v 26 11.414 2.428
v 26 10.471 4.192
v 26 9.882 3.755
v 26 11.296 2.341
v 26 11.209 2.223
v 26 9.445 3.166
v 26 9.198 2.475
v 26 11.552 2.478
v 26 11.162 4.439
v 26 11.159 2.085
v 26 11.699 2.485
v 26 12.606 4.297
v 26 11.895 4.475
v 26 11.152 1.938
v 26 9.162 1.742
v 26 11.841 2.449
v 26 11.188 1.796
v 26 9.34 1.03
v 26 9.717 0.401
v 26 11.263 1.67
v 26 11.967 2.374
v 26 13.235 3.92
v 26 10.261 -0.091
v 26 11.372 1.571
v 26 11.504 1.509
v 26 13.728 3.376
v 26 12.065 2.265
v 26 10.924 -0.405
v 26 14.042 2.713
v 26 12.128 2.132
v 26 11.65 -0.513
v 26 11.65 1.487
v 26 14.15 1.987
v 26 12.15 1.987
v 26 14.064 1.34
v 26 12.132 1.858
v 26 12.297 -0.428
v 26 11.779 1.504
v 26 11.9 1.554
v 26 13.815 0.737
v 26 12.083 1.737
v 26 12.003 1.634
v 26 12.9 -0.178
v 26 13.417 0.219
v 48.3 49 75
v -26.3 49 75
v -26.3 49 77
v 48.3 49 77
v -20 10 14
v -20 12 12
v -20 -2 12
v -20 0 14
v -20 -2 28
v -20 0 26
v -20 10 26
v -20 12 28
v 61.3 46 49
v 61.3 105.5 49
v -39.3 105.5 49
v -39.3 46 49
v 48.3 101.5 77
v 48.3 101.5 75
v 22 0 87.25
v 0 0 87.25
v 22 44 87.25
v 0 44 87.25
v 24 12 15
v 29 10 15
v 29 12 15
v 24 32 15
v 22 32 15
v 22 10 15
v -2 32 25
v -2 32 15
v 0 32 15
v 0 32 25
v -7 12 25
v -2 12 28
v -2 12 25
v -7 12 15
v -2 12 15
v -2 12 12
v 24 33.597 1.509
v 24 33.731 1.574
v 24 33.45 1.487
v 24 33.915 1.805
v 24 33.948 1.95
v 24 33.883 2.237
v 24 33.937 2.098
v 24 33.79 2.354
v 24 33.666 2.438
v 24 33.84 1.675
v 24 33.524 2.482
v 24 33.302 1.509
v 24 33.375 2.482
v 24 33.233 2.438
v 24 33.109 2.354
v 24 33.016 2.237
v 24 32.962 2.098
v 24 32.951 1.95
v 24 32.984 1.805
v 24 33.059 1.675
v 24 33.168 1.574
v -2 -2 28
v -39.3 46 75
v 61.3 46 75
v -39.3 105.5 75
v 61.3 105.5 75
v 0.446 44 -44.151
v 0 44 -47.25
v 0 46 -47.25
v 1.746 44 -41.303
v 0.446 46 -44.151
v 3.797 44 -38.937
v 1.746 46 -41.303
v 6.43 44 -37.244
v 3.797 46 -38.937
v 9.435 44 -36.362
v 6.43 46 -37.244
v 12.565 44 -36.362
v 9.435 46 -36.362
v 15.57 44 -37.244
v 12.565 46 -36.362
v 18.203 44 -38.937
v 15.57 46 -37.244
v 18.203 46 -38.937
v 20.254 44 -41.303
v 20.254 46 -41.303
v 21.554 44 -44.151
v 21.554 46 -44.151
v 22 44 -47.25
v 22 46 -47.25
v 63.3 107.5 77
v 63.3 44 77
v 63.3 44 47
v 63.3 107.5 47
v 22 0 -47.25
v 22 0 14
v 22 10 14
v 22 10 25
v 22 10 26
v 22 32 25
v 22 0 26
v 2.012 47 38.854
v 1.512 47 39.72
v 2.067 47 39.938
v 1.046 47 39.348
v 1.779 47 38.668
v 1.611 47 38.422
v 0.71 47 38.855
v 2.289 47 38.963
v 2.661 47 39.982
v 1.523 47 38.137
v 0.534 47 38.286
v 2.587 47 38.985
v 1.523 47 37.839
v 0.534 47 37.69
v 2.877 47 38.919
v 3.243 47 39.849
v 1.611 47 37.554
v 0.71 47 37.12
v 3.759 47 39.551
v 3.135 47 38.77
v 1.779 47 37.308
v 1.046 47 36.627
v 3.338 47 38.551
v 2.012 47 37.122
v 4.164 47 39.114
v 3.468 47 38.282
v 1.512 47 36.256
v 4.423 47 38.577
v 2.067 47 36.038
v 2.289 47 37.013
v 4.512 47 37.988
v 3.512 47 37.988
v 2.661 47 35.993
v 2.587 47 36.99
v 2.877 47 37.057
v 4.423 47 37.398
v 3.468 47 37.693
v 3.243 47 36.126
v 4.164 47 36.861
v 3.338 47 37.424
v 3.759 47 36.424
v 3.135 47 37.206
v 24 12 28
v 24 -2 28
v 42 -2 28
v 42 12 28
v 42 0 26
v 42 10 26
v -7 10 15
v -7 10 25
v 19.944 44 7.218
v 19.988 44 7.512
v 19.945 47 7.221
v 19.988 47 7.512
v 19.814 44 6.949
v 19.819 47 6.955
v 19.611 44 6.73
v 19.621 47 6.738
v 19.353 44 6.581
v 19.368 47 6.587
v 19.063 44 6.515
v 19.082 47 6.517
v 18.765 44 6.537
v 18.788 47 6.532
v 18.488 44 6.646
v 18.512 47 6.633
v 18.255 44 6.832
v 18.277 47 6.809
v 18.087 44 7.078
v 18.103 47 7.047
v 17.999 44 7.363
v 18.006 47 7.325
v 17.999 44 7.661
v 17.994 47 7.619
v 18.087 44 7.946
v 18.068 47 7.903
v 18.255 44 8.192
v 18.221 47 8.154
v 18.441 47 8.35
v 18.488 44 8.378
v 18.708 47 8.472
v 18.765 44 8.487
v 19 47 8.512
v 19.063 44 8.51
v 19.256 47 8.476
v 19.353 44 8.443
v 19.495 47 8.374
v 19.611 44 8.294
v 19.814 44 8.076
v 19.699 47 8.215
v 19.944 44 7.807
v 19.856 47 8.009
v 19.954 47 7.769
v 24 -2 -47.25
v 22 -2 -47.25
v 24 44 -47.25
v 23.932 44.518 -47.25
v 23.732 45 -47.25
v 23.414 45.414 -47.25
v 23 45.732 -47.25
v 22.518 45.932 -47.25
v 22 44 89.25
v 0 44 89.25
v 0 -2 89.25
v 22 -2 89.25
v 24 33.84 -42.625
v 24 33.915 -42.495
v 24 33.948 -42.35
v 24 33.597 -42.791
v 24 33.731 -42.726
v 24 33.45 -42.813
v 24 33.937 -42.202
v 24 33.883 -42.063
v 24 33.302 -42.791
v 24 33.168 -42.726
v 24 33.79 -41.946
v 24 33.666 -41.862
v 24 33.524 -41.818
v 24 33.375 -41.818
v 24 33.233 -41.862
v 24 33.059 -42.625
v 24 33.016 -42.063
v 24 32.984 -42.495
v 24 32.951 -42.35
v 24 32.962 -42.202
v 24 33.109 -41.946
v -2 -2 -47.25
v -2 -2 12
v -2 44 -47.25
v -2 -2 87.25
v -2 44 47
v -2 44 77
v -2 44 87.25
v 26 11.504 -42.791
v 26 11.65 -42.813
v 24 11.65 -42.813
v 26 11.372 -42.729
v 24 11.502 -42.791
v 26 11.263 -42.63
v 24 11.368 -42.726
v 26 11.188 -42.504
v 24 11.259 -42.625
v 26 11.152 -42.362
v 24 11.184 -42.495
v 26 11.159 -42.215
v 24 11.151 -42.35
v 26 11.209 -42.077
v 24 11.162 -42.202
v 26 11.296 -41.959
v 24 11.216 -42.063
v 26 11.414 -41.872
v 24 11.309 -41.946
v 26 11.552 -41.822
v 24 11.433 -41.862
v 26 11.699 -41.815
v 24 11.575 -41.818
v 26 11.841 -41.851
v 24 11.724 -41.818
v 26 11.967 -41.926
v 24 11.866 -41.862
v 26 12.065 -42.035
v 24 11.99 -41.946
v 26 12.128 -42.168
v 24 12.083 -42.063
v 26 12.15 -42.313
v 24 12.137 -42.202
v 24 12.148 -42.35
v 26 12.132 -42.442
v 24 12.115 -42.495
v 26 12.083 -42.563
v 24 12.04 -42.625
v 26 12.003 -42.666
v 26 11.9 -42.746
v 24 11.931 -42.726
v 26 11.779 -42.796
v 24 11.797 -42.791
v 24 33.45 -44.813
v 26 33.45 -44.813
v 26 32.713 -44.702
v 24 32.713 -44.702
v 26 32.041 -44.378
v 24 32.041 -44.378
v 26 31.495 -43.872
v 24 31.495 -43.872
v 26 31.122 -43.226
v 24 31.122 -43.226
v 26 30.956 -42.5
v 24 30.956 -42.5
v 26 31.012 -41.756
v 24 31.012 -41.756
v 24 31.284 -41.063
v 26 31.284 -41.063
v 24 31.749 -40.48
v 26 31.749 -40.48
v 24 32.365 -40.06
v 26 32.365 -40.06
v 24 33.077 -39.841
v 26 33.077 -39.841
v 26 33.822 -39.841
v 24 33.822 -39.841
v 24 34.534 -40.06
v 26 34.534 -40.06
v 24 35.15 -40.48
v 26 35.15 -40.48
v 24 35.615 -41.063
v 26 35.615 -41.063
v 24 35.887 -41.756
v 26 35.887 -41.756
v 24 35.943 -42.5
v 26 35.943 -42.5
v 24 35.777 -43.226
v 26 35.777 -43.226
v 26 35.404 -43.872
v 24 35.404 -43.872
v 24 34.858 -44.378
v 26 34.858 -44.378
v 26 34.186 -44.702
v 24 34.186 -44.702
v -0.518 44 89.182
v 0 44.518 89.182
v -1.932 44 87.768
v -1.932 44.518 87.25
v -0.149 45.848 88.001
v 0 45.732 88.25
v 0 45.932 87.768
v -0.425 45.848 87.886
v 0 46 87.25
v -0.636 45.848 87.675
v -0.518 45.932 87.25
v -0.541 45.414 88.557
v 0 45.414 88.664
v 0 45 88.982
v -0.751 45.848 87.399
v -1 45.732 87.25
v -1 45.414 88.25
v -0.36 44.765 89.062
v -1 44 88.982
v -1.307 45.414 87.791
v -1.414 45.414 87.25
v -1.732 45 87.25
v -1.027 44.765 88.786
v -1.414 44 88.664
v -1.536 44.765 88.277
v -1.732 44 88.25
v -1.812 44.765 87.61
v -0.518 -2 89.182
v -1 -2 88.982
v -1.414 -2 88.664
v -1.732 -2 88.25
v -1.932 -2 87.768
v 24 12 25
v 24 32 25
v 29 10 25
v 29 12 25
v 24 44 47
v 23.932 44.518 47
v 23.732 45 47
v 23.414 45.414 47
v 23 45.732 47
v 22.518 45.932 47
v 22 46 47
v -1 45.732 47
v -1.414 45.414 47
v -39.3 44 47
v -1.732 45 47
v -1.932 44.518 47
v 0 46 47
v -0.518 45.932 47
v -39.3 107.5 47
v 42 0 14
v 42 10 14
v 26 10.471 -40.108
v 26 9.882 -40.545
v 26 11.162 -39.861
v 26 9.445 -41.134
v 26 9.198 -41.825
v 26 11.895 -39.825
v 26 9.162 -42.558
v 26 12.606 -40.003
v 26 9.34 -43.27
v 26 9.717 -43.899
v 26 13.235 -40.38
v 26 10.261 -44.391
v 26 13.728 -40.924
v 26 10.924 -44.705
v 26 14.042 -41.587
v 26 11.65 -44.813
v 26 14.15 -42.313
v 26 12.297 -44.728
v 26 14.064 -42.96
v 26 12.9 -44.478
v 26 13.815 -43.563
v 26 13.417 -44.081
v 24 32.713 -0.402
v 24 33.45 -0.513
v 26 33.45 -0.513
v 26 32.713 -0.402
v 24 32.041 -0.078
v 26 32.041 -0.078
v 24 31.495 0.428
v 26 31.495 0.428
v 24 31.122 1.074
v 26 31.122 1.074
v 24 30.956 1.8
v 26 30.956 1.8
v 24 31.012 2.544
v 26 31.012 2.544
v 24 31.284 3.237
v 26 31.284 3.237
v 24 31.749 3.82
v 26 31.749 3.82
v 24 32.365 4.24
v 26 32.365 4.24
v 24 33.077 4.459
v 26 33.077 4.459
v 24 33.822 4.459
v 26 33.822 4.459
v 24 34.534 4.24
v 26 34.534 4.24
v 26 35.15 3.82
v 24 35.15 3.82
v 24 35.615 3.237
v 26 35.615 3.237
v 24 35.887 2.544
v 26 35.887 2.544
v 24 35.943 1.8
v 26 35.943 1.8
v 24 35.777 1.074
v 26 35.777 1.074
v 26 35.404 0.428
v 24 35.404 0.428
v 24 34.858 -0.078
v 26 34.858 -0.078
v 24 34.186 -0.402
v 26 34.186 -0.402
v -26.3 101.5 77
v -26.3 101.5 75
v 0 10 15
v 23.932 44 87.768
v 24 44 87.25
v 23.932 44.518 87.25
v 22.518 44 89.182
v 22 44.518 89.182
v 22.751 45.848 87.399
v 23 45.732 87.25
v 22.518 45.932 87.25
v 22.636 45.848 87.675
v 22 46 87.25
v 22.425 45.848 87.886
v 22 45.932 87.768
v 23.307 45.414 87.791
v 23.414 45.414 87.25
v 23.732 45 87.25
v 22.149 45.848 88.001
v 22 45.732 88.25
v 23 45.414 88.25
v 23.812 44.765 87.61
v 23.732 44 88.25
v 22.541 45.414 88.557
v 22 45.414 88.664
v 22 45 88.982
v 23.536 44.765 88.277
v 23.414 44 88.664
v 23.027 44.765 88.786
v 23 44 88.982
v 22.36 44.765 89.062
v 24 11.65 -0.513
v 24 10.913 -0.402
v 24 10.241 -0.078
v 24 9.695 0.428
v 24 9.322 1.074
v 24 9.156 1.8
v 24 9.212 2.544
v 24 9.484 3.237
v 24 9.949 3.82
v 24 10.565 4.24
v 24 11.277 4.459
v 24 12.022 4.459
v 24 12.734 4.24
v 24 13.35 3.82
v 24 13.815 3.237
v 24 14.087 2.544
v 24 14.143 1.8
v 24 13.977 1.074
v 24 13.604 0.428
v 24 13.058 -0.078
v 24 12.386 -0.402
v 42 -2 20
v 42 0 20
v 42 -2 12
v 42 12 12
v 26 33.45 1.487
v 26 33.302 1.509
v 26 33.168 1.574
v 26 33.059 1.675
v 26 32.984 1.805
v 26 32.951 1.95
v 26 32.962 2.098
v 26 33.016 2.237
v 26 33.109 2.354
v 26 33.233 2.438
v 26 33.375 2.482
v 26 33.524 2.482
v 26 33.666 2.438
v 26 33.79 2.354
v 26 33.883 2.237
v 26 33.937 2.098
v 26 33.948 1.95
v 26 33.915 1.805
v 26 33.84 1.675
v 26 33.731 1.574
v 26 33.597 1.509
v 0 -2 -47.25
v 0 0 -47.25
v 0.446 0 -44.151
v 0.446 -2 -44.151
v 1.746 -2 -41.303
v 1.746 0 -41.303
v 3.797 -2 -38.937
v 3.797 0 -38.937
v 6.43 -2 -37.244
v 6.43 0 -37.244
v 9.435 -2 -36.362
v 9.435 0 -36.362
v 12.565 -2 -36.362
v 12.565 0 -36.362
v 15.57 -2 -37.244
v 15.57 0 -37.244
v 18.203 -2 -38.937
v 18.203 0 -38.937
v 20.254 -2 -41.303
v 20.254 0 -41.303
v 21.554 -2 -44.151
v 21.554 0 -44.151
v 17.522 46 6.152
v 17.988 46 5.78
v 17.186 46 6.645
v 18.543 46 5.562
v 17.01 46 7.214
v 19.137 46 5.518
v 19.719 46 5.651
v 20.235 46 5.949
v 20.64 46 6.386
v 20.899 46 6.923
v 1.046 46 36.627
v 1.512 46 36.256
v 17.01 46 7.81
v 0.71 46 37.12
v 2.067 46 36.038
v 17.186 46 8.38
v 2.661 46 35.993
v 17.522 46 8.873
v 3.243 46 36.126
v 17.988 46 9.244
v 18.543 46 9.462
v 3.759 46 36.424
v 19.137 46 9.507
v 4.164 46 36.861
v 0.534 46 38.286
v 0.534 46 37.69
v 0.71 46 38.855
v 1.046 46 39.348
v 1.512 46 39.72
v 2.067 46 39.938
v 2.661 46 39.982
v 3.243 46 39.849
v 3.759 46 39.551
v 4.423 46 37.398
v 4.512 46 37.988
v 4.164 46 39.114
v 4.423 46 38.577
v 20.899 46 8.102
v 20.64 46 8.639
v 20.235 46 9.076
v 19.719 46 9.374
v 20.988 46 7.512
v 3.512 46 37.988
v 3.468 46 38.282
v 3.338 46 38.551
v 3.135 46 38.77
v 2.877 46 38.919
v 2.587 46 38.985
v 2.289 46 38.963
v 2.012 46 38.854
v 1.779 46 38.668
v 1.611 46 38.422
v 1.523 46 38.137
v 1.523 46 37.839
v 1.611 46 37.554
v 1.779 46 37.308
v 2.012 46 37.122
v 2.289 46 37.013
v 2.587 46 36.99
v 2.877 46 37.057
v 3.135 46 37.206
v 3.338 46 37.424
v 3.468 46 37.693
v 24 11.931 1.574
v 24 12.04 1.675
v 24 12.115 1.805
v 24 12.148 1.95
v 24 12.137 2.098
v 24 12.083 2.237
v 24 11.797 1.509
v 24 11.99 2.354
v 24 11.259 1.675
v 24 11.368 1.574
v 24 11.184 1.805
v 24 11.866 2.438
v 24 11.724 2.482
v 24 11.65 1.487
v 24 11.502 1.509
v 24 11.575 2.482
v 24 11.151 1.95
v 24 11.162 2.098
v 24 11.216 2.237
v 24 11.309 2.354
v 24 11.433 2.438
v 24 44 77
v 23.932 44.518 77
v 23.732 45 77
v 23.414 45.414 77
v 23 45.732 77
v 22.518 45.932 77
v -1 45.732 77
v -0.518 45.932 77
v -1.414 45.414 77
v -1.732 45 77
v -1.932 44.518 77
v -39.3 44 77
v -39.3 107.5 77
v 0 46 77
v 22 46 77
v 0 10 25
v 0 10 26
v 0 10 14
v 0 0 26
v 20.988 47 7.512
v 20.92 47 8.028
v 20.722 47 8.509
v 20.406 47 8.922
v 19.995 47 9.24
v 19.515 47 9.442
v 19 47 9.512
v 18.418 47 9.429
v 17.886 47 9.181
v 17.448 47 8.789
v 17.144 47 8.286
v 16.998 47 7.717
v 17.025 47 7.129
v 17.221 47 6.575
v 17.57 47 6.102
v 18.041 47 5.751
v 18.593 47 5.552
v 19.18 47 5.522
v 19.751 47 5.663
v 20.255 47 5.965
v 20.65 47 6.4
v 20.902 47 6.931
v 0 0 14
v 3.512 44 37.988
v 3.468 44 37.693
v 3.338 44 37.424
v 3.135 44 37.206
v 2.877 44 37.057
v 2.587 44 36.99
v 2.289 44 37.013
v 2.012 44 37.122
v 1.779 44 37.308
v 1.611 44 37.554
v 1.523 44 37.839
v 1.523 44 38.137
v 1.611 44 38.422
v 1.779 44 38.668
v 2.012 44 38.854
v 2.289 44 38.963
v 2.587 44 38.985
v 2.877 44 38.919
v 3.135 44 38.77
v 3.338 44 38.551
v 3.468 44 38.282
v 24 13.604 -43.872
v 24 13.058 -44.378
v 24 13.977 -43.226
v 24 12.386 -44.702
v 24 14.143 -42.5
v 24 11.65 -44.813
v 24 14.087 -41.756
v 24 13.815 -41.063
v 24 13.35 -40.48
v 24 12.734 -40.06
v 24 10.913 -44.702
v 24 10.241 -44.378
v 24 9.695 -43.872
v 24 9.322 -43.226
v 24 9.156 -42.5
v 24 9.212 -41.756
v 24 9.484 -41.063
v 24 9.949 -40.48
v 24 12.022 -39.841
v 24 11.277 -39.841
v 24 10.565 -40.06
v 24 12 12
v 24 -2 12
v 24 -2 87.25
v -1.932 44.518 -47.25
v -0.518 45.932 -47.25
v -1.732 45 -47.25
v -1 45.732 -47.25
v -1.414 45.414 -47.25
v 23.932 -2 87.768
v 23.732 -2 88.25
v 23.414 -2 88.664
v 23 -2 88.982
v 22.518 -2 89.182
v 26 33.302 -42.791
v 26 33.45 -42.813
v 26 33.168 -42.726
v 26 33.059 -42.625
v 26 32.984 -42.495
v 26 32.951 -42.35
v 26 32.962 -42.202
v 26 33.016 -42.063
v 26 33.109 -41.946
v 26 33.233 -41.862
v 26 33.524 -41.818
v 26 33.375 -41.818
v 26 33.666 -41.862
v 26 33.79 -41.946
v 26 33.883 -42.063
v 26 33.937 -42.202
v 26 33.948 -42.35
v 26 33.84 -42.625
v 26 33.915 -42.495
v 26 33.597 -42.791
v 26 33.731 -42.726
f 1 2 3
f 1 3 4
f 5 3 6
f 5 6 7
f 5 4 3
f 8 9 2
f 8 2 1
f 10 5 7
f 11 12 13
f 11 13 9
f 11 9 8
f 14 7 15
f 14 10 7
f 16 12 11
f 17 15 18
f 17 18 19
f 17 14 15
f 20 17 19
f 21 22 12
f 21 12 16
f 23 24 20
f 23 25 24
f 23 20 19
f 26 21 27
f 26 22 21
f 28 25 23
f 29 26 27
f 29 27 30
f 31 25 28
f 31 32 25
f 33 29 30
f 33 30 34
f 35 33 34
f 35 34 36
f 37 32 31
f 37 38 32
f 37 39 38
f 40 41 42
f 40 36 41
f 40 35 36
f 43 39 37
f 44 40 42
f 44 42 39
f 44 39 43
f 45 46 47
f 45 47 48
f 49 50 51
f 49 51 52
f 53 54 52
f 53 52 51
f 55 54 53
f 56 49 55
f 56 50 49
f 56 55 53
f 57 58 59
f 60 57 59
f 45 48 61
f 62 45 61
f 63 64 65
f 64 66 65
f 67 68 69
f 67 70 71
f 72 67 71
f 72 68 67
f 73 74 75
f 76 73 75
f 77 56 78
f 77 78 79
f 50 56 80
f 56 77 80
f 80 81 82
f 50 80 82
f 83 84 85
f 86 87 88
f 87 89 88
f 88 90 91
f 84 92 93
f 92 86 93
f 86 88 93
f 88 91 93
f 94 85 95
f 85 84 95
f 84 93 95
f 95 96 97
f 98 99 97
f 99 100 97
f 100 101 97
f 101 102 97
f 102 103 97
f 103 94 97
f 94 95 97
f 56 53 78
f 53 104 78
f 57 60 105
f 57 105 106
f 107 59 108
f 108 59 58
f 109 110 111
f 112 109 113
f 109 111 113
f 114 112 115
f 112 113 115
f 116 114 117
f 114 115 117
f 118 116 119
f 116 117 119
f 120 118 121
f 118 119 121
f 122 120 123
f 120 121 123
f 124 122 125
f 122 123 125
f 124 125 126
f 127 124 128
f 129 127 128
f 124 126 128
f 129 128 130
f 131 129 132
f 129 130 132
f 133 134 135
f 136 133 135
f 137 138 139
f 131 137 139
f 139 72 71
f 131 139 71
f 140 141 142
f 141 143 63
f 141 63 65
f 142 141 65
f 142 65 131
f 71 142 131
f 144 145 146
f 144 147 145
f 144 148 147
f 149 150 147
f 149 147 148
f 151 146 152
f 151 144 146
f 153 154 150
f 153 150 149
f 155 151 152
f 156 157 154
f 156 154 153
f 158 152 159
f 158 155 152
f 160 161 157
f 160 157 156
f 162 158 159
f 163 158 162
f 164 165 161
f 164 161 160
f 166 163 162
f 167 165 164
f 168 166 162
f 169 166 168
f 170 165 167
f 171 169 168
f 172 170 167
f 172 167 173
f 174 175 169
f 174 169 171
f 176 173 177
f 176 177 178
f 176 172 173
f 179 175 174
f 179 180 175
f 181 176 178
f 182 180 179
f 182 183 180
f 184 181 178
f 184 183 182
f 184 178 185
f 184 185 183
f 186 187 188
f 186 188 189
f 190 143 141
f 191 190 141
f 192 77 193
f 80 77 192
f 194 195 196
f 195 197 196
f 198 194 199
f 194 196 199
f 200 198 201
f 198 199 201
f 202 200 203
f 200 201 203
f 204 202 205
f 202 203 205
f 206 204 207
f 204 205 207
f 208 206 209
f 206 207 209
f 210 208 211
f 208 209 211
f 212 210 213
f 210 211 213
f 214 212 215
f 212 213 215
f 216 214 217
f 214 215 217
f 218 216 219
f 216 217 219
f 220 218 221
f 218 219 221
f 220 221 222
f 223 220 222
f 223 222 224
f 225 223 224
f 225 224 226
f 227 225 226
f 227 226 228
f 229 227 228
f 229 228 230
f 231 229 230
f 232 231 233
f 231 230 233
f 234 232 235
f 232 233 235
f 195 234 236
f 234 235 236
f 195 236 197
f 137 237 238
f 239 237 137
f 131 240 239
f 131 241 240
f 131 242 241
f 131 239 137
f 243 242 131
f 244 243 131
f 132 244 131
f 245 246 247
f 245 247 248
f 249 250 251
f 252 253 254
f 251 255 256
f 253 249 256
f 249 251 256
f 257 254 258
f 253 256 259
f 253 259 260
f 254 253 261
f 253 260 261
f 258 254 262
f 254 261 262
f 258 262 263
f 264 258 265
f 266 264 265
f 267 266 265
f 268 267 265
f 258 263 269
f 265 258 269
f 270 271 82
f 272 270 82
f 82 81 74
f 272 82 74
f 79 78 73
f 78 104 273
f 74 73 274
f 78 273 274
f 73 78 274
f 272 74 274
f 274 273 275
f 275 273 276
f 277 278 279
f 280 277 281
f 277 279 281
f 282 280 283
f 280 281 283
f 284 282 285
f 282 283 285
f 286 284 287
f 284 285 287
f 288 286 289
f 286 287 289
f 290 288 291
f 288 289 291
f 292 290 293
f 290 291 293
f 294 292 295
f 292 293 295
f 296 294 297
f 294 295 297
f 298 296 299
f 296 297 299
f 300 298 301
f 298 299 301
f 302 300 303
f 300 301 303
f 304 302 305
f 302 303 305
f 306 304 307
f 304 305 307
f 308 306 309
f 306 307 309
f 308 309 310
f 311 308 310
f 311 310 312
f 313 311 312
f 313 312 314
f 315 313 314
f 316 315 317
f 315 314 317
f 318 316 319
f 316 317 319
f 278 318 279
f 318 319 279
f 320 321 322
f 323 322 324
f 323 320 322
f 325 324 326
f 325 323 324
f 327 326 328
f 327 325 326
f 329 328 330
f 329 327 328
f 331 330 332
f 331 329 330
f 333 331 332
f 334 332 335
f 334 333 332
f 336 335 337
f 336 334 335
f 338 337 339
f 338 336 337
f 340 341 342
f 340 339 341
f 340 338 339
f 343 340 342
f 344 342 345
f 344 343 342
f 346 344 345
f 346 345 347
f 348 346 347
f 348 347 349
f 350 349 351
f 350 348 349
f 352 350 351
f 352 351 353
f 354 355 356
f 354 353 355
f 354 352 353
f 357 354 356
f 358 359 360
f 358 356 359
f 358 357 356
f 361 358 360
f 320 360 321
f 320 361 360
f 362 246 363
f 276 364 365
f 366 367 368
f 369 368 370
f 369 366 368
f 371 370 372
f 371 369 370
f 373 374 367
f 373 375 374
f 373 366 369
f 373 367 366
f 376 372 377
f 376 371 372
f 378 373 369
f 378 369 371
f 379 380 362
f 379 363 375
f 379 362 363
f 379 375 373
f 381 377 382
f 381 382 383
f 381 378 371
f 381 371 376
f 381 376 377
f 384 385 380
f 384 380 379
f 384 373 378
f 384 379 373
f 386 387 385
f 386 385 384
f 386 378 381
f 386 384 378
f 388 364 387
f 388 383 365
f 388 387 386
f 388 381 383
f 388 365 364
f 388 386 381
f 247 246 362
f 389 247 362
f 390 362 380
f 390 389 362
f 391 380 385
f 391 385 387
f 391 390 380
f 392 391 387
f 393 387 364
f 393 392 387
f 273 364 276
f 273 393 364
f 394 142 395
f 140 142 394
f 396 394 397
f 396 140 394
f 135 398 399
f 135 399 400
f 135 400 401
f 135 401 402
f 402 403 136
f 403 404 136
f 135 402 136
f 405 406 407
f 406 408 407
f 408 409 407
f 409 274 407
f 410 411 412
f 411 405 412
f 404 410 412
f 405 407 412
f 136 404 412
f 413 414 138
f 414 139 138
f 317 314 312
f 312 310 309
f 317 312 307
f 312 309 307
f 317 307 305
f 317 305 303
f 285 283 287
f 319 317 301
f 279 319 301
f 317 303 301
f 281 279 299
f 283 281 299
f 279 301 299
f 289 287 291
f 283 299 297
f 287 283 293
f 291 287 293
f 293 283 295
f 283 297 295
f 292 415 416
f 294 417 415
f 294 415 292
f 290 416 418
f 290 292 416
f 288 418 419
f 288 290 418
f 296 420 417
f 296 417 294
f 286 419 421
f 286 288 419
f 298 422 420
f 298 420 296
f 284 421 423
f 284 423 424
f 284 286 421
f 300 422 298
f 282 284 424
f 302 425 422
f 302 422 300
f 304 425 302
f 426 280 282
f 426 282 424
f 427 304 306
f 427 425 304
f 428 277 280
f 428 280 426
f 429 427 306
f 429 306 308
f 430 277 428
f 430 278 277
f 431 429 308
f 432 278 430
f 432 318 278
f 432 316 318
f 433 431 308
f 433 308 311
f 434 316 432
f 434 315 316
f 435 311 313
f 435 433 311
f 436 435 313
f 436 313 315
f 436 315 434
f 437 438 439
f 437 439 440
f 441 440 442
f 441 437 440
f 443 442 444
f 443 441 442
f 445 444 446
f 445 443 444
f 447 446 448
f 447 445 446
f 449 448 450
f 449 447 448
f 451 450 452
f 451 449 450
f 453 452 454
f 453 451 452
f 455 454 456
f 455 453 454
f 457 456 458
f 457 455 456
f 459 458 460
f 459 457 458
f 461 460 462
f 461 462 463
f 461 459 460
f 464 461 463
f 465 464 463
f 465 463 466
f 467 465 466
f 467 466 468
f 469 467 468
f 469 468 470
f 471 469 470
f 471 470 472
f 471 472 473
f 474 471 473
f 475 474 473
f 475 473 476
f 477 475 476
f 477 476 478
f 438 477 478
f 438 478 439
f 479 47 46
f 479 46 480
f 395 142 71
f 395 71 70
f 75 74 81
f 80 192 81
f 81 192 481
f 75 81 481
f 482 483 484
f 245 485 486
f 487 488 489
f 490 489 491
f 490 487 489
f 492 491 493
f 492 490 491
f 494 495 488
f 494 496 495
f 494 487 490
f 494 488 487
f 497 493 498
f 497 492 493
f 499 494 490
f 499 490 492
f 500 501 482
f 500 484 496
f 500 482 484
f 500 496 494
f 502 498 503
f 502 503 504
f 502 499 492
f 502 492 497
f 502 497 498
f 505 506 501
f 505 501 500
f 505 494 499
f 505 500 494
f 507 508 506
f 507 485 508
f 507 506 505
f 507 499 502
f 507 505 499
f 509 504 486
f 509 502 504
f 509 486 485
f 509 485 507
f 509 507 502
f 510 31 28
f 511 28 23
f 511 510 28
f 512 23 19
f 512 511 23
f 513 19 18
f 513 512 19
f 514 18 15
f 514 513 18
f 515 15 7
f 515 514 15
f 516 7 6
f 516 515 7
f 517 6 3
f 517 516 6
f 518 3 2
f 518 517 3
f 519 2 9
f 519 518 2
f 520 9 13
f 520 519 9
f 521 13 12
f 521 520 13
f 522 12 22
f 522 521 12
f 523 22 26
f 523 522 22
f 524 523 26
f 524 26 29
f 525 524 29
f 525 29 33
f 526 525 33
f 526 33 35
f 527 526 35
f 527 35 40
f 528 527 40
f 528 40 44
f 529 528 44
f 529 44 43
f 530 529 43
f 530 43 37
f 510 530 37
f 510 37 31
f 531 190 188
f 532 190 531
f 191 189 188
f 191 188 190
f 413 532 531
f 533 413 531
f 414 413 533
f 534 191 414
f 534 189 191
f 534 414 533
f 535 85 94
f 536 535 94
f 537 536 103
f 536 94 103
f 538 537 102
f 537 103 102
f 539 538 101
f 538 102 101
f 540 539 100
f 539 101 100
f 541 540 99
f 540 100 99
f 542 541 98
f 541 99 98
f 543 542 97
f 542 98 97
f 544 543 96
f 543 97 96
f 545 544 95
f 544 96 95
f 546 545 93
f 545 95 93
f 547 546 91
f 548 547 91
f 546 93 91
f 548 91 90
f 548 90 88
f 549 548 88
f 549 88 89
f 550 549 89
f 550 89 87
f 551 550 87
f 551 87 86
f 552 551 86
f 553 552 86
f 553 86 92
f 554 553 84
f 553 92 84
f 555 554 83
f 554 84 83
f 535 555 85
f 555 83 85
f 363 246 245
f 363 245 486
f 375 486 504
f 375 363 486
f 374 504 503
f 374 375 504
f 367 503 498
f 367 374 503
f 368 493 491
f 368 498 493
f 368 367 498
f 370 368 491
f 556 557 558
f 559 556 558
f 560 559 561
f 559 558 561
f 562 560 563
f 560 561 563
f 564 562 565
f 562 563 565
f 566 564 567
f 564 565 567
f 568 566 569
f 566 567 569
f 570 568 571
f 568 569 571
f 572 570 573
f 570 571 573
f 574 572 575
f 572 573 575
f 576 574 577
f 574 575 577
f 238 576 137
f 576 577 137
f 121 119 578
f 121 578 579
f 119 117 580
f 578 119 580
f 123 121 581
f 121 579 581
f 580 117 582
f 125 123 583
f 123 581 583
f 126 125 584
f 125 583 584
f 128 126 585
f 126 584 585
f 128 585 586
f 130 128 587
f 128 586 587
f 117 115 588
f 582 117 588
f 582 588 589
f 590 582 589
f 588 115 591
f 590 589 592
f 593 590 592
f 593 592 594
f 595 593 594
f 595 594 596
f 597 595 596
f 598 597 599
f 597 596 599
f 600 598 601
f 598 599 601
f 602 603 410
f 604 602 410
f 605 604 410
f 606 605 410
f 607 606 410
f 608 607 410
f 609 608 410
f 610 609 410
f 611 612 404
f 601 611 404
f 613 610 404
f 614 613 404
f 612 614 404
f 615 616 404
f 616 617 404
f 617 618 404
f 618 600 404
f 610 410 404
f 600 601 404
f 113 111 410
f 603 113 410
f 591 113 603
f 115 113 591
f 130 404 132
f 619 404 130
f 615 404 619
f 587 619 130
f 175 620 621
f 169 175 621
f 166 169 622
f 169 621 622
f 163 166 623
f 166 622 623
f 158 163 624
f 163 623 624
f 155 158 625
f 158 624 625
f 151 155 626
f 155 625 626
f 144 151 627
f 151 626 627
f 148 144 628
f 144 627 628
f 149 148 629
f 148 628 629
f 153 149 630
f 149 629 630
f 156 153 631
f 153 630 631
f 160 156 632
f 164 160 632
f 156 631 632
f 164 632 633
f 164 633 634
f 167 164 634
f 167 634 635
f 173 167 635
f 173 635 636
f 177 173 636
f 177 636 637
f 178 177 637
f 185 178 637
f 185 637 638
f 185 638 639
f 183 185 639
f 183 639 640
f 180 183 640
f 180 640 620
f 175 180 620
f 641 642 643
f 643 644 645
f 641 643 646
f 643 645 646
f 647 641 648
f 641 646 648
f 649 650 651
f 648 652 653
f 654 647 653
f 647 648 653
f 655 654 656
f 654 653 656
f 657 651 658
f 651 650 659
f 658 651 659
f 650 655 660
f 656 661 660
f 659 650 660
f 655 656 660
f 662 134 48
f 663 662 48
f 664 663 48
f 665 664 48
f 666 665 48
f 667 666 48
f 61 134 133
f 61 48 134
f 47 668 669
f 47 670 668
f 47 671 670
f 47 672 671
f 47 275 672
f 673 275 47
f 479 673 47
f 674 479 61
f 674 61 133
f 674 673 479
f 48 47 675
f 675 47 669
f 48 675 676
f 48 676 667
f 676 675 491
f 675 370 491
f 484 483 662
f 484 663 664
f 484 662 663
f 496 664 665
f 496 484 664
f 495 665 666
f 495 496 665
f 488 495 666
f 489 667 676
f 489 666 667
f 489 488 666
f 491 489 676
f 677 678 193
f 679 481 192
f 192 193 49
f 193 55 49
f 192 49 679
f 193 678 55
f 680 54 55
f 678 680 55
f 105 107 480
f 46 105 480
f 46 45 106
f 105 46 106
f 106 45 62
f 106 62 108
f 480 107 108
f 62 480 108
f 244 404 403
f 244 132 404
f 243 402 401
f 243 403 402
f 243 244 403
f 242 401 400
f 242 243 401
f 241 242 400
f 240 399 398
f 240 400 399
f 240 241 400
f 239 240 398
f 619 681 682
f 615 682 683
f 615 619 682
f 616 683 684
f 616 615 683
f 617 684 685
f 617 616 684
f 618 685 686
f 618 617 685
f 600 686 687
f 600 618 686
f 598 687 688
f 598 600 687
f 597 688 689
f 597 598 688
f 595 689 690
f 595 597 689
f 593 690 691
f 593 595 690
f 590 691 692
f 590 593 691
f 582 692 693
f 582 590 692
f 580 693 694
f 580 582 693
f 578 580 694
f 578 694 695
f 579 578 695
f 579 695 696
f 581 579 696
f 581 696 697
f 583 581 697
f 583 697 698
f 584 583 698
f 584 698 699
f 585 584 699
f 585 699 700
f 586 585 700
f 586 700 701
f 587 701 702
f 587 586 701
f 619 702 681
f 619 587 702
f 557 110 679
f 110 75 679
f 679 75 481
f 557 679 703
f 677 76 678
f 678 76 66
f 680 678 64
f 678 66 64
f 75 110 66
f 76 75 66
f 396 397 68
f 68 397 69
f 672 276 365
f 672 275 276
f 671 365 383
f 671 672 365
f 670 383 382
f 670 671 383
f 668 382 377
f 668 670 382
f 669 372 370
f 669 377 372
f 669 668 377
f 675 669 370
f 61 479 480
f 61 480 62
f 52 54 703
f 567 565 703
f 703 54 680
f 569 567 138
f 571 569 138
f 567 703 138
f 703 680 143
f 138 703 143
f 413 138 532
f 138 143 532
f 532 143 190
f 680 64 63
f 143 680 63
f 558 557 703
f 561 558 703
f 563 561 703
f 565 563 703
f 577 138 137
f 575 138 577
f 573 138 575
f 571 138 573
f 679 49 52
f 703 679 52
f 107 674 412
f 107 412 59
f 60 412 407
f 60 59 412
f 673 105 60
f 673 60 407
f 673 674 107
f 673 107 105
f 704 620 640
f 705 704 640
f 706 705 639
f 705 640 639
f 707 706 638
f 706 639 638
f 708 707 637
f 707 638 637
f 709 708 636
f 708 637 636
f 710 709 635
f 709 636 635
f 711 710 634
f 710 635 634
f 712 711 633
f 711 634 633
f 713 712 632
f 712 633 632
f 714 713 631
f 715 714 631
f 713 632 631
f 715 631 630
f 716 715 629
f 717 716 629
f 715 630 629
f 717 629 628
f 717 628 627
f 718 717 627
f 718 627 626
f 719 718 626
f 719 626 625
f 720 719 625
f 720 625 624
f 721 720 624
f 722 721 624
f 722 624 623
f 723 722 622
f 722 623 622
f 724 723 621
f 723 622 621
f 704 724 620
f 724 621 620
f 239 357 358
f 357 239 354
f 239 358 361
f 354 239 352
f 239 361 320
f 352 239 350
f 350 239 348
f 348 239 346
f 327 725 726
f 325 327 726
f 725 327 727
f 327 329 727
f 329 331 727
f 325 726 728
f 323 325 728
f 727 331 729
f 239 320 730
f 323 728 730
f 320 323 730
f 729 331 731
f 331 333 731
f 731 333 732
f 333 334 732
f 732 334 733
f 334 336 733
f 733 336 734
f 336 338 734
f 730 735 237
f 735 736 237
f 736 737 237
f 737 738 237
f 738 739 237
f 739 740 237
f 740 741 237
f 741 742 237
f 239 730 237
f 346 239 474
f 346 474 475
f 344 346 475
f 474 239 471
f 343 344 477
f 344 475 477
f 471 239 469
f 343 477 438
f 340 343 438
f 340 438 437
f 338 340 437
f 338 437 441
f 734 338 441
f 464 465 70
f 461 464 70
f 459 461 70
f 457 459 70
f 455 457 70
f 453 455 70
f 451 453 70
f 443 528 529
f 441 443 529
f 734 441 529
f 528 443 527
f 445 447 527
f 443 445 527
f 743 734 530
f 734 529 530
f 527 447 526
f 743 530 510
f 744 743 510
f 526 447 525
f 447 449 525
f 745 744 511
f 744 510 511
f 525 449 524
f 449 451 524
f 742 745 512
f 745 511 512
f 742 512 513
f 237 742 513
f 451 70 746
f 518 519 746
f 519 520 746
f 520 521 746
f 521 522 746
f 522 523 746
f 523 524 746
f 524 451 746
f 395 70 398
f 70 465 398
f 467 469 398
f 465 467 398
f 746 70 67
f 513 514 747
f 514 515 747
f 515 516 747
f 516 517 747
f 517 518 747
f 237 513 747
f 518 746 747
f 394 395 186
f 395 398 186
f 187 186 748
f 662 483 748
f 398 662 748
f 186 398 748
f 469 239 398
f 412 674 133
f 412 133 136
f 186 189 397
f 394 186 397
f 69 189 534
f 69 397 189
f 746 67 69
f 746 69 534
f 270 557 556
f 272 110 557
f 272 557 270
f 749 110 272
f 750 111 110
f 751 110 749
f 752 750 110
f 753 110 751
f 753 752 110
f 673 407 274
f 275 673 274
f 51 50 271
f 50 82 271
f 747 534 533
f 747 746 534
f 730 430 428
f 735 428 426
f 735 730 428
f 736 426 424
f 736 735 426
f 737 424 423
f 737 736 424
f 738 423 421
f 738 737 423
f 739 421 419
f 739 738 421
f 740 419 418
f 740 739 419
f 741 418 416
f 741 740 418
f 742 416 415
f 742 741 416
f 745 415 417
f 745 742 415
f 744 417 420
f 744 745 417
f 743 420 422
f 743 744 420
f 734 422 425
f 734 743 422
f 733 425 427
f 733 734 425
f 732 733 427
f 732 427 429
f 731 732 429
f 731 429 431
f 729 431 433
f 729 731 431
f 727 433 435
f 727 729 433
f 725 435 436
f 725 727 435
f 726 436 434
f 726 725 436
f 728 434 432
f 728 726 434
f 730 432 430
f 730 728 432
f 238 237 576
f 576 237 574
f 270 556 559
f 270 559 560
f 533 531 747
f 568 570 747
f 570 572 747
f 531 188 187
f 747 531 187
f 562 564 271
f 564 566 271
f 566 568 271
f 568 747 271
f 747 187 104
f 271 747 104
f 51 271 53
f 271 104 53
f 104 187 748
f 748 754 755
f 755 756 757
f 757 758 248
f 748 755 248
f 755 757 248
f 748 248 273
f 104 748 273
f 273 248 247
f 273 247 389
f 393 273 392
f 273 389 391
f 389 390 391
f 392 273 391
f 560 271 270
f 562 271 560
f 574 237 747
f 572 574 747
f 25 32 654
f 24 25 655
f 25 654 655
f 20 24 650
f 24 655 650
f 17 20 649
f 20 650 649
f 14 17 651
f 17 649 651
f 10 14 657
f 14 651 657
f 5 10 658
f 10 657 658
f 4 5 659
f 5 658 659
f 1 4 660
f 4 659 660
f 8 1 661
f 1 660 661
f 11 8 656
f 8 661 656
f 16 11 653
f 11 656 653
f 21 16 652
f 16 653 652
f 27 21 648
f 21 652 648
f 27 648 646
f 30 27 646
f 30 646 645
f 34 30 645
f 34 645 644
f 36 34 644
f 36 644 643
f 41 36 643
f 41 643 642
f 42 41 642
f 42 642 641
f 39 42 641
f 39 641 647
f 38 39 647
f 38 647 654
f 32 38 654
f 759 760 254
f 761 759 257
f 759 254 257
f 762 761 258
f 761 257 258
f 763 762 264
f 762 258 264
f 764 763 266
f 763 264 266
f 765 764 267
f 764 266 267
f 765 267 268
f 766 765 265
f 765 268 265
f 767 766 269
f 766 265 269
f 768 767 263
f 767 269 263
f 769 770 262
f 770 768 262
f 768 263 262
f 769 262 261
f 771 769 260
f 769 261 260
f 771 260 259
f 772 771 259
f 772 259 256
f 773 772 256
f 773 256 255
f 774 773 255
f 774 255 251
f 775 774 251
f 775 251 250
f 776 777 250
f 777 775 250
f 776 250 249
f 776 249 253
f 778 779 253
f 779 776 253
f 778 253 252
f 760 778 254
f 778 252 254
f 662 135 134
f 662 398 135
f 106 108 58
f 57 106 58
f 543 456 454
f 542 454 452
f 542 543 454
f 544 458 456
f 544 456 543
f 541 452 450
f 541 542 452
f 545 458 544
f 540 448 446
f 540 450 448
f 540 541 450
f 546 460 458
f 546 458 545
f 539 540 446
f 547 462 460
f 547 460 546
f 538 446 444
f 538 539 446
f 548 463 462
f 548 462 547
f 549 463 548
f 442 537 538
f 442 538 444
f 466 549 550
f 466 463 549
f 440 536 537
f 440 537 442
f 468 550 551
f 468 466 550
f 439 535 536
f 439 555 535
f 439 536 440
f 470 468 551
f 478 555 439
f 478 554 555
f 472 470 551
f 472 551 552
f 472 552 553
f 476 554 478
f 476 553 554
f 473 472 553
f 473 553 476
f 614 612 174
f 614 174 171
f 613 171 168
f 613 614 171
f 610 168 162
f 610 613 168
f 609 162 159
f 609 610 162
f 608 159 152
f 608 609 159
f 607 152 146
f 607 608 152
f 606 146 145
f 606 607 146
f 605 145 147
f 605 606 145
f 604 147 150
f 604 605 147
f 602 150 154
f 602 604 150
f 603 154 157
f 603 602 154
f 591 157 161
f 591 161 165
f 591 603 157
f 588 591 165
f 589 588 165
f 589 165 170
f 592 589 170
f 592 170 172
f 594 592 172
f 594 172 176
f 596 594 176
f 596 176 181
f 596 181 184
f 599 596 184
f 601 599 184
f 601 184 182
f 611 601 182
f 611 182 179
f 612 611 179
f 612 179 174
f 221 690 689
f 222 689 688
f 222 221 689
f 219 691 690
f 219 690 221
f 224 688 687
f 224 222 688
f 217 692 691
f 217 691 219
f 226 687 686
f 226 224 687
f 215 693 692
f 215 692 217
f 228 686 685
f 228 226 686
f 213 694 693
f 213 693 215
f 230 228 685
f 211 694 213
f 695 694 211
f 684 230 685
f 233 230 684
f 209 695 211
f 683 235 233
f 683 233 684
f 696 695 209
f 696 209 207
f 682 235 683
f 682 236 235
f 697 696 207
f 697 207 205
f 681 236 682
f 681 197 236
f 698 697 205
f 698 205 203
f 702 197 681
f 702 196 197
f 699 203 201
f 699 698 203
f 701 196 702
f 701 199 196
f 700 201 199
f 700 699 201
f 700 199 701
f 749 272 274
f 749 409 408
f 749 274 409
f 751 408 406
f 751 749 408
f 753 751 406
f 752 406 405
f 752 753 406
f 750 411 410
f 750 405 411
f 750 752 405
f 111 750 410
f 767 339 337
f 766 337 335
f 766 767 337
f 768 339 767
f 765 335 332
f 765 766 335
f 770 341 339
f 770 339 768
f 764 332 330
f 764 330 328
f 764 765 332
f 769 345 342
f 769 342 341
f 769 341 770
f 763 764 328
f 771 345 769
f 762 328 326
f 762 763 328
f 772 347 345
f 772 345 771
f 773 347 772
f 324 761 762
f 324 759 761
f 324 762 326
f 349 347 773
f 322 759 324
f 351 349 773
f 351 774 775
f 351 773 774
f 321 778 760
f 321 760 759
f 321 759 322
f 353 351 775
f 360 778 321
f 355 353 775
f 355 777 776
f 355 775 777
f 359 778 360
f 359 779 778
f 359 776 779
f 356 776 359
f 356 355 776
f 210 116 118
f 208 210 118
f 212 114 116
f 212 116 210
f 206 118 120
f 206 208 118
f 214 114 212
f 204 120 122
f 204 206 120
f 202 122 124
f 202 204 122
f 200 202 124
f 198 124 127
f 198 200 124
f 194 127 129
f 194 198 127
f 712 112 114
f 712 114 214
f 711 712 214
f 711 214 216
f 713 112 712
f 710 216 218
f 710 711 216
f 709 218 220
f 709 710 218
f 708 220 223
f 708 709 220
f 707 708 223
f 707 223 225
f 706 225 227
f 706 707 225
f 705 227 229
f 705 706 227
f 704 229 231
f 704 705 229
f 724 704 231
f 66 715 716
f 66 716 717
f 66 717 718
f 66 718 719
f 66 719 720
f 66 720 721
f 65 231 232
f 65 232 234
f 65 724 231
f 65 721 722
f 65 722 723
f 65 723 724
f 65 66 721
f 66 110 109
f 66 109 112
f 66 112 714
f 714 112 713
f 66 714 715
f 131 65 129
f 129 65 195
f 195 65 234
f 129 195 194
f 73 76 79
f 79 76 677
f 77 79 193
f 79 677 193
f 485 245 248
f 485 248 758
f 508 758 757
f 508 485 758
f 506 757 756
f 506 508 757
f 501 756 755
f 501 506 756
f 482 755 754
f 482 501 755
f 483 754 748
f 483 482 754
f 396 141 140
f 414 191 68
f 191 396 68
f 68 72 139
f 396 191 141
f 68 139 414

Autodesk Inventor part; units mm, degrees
ref_plane "YZ Plane" through (0, 0, 0) normal (1, 0, 0) x (0, 1, 0)
ref_plane "XZ Plane" through (0, 0, 0) normal (0, 1, 0) x (-1, 0, 0)
ref_plane "XY Plane" through (0, 0, 0) normal (0, 0, 1) x (1, 0, 0)
sketch "Sketch1" plane through (0, 0, 0) normal (0, 0, 1) x (1, 0, 0)
  line L0 (0, 0) -> (22, 0)
  line L1 (22, 0) -> (22, 45)
  line L2 (22, 45) -> (0, 45)
  line L3 (0, 45) -> (0, 0)
  line L4 (-2, 47) -> (24, 47)
  line L5 (24, 47) -> (24, -2)
  line L6 (24, -2) -> (-2, -2)
  line L7 (-2, -2) -> (-2, 47)
  dimension "d0" = 22
  dimension "d1" = 45
  dimension "d2" = 2
extrude "Extrusion1" add sketch "Sketch1" along normal blind 40
sketch "Sketch2" plane through (24, -2, 0) normal (1, 0, 0) x (0, 0, -1)
  line L0 (0, 0) -> (-40, 0) projected
  line L1 (-20, 0) -> (-20, 2)
  line L2 (-20, 2) -> (-14, 2)
  line L3 (-14, 2) -> (-14, 12)
  line L4 (-14, 12) -> (-26, 12)
  line L5 (-26, 12) -> (-26, 2)
  line L6 (-26, 2) -> (-14, 2)
  line L7 (-28, 14) -> (-12, 14)
  line L8 (-12, 14) -> (-12, 0)
  line L9 (-12, 0) -> (-28, 0)
  line L10 (-28, 0) -> (-28, 14)
  point P0 (0, 2)
  dimension "d5" = 2
  dimension "d6" = 6
  dimension "d7" = 10
  dimension "d8" = 12
  dimension "d9" = 2
extrude "Extrusion2" add sketch "Sketch2" along normal blind 18
sketch "Sketch3" plane through (-2, -2, 0) normal (-1, 0, 0) x (0, 0, 1)
  line L0 (26, 12) -> (26, 2) projected
  line L1 (14, 12) -> (26, 12) projected
  line L2 (14, 2) -> (14, 12) projected
  line L3 (0, 2) -> (40, 2) projected
  line L4 (28, 0) -> (28, 14) projected
  line L5 (28, 14) -> (12, 14) projected
  line L6 (12, 14) -> (12, 0) projected
  line L7 (0, 0) -> (40, 0) projected
extrude "Extrusion3" add sketch "Sketch3" along normal blind 18 contours L1 L2 L3 L6 L5 L4 L0 | L3 L4 L7 L6
sketch "Sketch4" plane through (-2, 0, 26) normal (-1, 0, 0) x (0, 0, 1)
  line L0 (-12, 0) -> (0, 0) projected
  line L1 (0, 0) -> (0, 10) projected
  line L2 (0, 10) -> (-12, 10) projected
  line L3 (-12, 10) -> (-12, 0) projected
  point P0 (-26, 0)
extrude "Extrusion4" cut sketch "Sketch4" against normal blind 40
sketch "Sketch5" plane through (24, 12, 28) normal (0, 1, 0) x (1, 0, 0)
  line L0 (-26, 28) -> (-26, -12) projected
  line L1 (0, 28) -> (0, -12) projected
  line L2 (0, 8) -> (0, 13)
  line L3 (0, 13) -> (0, 3)
  line L4 (0, 13) -> (-2, 13)
  line L5 (-2, 13) -> (-2, 3)
  line L6 (-2, 28) -> (-2, -12) projected
  line L7 (-2, 3) -> (0, 3)
  line L8 (0, 3) -> (5, 3)
  line L9 (5, 3) -> (5, 13)
  line L10 (5, 13) -> (0, 13)
  line L11 (-26, 28) -> (0, 28) projected
  line L12 (-13, 28) -> (-13, 3)
  line L13 (-26, 28) -> (-26, -12)
  line L14 (-26, 8) -> (-26, 13)
  line L15 (-26, 13) -> (-26, 3)
  line L16 (-26, 13) -> (-24, 13)
  line L17 (-24, 13) -> (-24, 3)
  line L18 (-24, 28) -> (-24, -12)
  line L19 (-24, 3) -> (-26, 3)
  line L20 (-26, 3) -> (-31, 3)
  line L21 (-31, 3) -> (-31, 13)
  line L22 (-31, 13) -> (-26, 13)
  dimension "d16" = 5
  dimension "d17" = 10
  dimension "d18" = 2
  dimension "d19" = 5
extrude "Extrusion5" cut sketch "Sketch5" along normal blind 20 contours L16 L17 L19 L0 | L0 L20 L21 L22 | L4 L1 L7 L5 | L10 L9 L8 L1
sketch "Sketch6" plane through (-20, 12, 12) normal (0, 1, 0) x (1, 0, 0)
  line L0 (20, -3) -> (18, -3) projected
  line L1 (18, -13) -> (20, -13) projected
  line L2 (20, -3) -> (20, -13) projected
  line L3 (42, -13) -> (42, -3) projected
  line L4 (44, -3) -> (42, -3) projected
  line L5 (42, -13) -> (44, -13) projected
  line L6 (44, -3) -> (44, 0) projected
  line L7 (44, -3) -> (44, -13)
  line L8 (18, -3) -> (18, -13)
  line L9 (18, -13) -> (13, -13)
  line L10 (13, -13) -> (13, -3)
  line L11 (13, -3) -> (18, -3)
  line L12 (44, -16) -> (44, -13) projected
  line L13 (44, -13) -> (49, -13)
  line L14 (49, -13) -> (49, -3)
  line L15 (49, -3) -> (44, -3)
  line L16 (44, -13) -> (44, -3)
  point P0 (20, 12)
  dimension "d22" = 5
  dimension "d23" = 5
extrude "Extrusion6" cut sketch "Sketch6" against normal blind 5
sketch "Sketch7" plane through (0, 0, 40) normal (0, 0, 1) x (1, 0, 0)
  line L0 (0, 0) -> (0, 45) projected
  line L1 (0, 45) -> (22, 45) projected
  line L2 (22, 45) -> (22, 0) projected
  line L3 (22, 0) -> (0, 0) projected
  line L4 (24, 47) -> (-2, 47) projected
  line L5 (-2, 47) -> (-2, -2) projected
  line L6 (-2, -2) -> (24, -2) projected
  line L7 (24, -2) -> (24, 47) projected
extrude "Extrusion7" add sketch "Sketch7" along normal blind 30
sketch "Sketch8" plane through (0, 0, 0) normal (0, 0, -1) x (-1, 0, 0)
  line L0 (-22, 45) -> (0, 45) projected
  line L1 (-22, 44) -> (0, 44)
  line L2 (-22, 44) -> (-22, 45)
  line L3 (2, 47) -> (-24, 47) projected
  line L4 (0, 0) -> (0, 45) projected
  line L5 (0, 44) -> (0, 45)
  line L6 (0, 45) -> (-22, 45) projected
  line L7 (0, 45) -> (-22, 45)
  dimension "d28" = 1
extrude "Extrusion8" add sketch "Sketch8" against normal blind 70
sketch "Sketch9" plane through (-2, 47, 0) normal (0, 1, 0) x (1, 0, 0)
  line L0 (0, 0) -> (26, 0) projected
  line L1 (0, 0) -> (0, -70) projected
  line L2 (26, -70) -> (0, -70) projected
  line L3 (26, 0) -> (26, -70) projected
  point P0 (2, 0)
extrude "Extrusion9" cut sketch "Sketch9" against normal blind 1
sketch "Sketch10" plane through (0, 0, 70) normal (0, 0, 1) x (1, 0, 0)
  line L0 (24, 46) -> (-2, 46) projected
  line L1 (-2, 46) -> (-2, -2) projected
  line L2 (-2, -2) -> (24, -2) projected
  line L3 (24, -2) -> (24, 46) projected
  line L4 (22, 44) -> (22, 0) projected
  line L5 (22, 0) -> (0, 0) projected
  line L6 (0, 0) -> (0, 44) projected
  line L7 (0, 44) -> (22, 44) projected
extrude "Extrusion10" add sketch "Sketch10" along normal blind 17.25
sketch "Sketch11" plane through (0, 0, 0) normal (0, 0, -1) x (-1, 0, 0)
  line L0 (2, 46) -> (-24, 46) projected
  line L1 (-24, 46) -> (-24, -2) projected
  line L2 (-24, -2) -> (2, -2) projected
  line L3 (2, -2) -> (2, 46) projected
  line L4 (0, 44) -> (0, 0) projected
  line L5 (0, 0) -> (-22, 0) projected
  line L6 (-22, 0) -> (-22, 44) projected
  line L7 (0, 44) -> (-22, 44) projected
extrude "Extrusion11" add sketch "Sketch11" along normal blind 47.25
sketch "Sketch12" plane through (24, -2, 28) normal (1, 0, 0) x (0, 0, -1)
  circle A0 centre (70.3128, 35.4495) radius 0.5
  line L0 (70.3128, 35.4495) -> (70.3128, 13.6495)
  circle A1 centre (70.3128, 13.6495) radius 0.5
  line L1 (70.3128, 35.4495) -> (26.0128, 35.4495)
  line L2 (26.0128, 35.4495) -> (26.0128, 13.6495)
  circle A2 centre (26.0128, 35.4495) radius 0.5
  circle A3 centre (26.0128, 13.6495) radius 0.5
  circle A4 centre (26.0128, 35.4495) radius 2.5
  circle A5 centre (26.0128, 13.6495) radius 2.5
  circle A6 centre (70.3128, 35.4495) radius 2.5
  circle A7 centre (70.3128, 13.6495) radius 2.5
  point P0 (28, 2)
  dimension "d37" = 1
  dimension "d38" = 21.8
  dimension "d39" = 1
  dimension "d40" = 44.3
  dimension "d41" = 1
  dimension "d42" = 1
  dimension "d43" = 2
  dimension "d44" = 2
  dimension "d45" = 2
  dimension "d46" = 2
extrude "Extrusion12" add sketch "Sketch12" along normal blind 2 contours A0 L1 A6 L0 | A0 L0 A6 L1 | A5 | A4 L2 A2 L1 | L1 A2 L2 A4 | A7
sketch "Sketch13" plane through (-2, 46, 0) normal (0, 1, 0) x (1, 0, 0)
  line L0 (0, -87.25) -> (0, 47.25) projected
  line L1 (0, -20) -> (0, 2)
  line L2 (0, 2) -> (0, -42)
  line L3 (0, 2) -> (26, 2)
  line L4 (26, 47.25) -> (26, -87.25) projected
  line L5 (13, 2) -> (-9, 2)
  line L6 (-9, 2) -> (-9, -42)
  line L7 (-9, -42) -> (35, -42)
  line L8 (35, -42) -> (35, 2)
  line L9 (35, 2) -> (-9, 2)
  point P0 (2, 0)
  dimension "d49" = 22
  dimension "d50" = 44
  dimension "d51" = 22
  dimension "d52" = 44
  dimension "d53" = 44
extrude "Extrusion13" add sketch "Sketch13" against normal blind 2
sketch "Sketch14" plane through (-2, 46, 0) normal (0, 1, 0) x (1, 0, 0)
  line L0 (35, 2) -> (35, -42) projected
  line L1 (35, 2) -> (35, -1.5)
  line L2 (35, -1.5) -> (31.5, -1.5)
  circle A0 centre (31.5, -1.5) radius 1
  line L3 (35, -20) -> (25.0938, -20)
  circle A1 centre (31.5, -38.5) radius 1
  line L4 (2, 47.25) -> (24, 47.25) projected
  line L5 (13, 47.25) -> (13, 21.5111)
  circle A2 centre (-5.5, -1.5) radius 1
  circle A3 centre (-5.5, -38.5) radius 1
  circle A4 centre (-5.5, -38.5) radius 2
  circle A5 centre (-5.5, -1.5) radius 2
  circle A6 centre (31.5, -38.5) radius 2
  circle A7 centre (31.5, -1.5) radius 2
  point P0 (2, 0)
  dimension "d56" = 3.5
  dimension "d57" = 3.5
  dimension "d58" = 2
  dimension "d59" = 1
  dimension "d60" = 1
  dimension "d61" = 1
  dimension "d62" = 1
extrude "Extrusion14" add sketch "Sketch14" along normal blind 1
sketch "Sketch15" plane through (-2, 46, 0) normal (0, 1, 0) x (1, 0, 0)
  circle A0 centre (-5.5, -38.5) radius 1 projected
  circle A1 centre (-5.5, -1.5) radius 1 projected
  circle A2 centre (31.5, -1.5) radius 1 projected
  circle A3 centre (31.5, -38.5) radius 1 projected
  point P0 (2, 0)
extrude "Extrusion15" cut sketch "Sketch15" against normal blind 3
sketch "Sketch16" plane through (-2, 46, 0) normal (0, 1, 0) x (1, 0, 0)
  line L0 (24, -87.25) -> (24, 47.25) projected
  line L1 (2, 47.25) -> (2, -87.25) projected
  line L2 (2, -14) -> (2, 47.25) projected
  line L3 (2, 47.25) -> (2, -2.75)
  line L4 (2.012, -37.9877) -> (4.512, -37.9877)
  circle A0 centre (4.512, -37.9877) radius 1
  line L5 (4.512, -37.9877) -> (4.512, -67.9877)
  line L6 (4.5, -37.75) -> (21, -37.75)
  circle A1 centre (20.988, -7.5123) radius 1
  circle A2 centre (4.512, -37.9877) radius 2
  circle A3 centre (20.988, -7.5123) radius 2
  line L7 (21, -7.75) -> (21, -37.75)
  point P0 (2, 0)
  dimension "d67" = 50
  dimension "d68" = 2.5
  dimension "d69" = 2
  dimension "d70" = 30
  dimension "d71" = 16.5
  dimension "d72" = 2
  dimension "d73" = 1
  dimension "d74" = 1
  dimension "d91" = 30
extrude "Extrusion16" add sketch "Sketch16" along normal blind 1 contours A2 L6 A0 L4 | A3 | L4 A0 L5 A2 | A2 L5 A0 L6
sketch "Sketch17" plane through (-2, 46, 0) normal (0, 1, 0) x (1, 0, 0)
  circle A0 centre (4.512, -37.9877) radius 1 projected
  circle A1 centre (20.988, -7.5123) radius 1 projected
  point P0 (2, 0)
extrude "Extrusion17" cut sketch "Sketch17" against normal blind 3
sketch "Sketch18" plane through (-2, 46, 0) normal (0, 1, 0) x (1, 0, 0)
  line L0 (-9, -42) -> (0, -42) projected
  line L1 (0, -87.25) -> (0, -42) projected
  line L2 (0, -47) -> (26, -47)
  line L3 (26, -42) -> (26, -87.25) projected
  line L4 (0, -49) -> (26, -49)
  line L5 (0, -75) -> (26, -75)
  line L6 (0, -77) -> (26, -77)
  line L7 (0, -47) -> (0, -49)
  line L8 (26, -47) -> (26, -49)
  line L9 (26, -75) -> (26, -77)
  line L10 (0, -75) -> (0, -77)
  point P0 (2, 0)
  dimension "d79" = 5
  dimension "d80" = 2
  dimension "d81" = 26
  dimension "d82" = 2
extrude "Extrusion18" add sketch "Sketch18" along normal blind 30 contours L1 L2 L3 L4
sketch "Sketch19" plane through (-2, 46, 0) normal (0, 1, 0) x (1, 0, 0)
  line L0 (0, -49) -> (26, -49) projected
  line L1 (0, -75) -> (26, -75)
  line L2 (0, -77) -> (26, -77)
  line L3 (0, -75) -> (0, -77)
  line L4 (0, -28) -> (0, -87.25) projected
  line L5 (26, -75) -> (26, -77)
  line L6 (26, -49) -> (26, -87.25) projected
  point P0 (2, 0)
  dimension "d85" = 26
  dimension "d86" = 2
extrude "Extrusion19" add sketch "Sketch19" along normal blind 3 contours L1 L5 L2 L3
sketch "Sketch20" plane through (-2, 46, 0) normal (0, 1, 0) x (1, 0, 0)
  line L0 (26, -42) -> (26, -47) projected
  line L1 (26, 47.25) -> (26, 2) projected
  line L2 (0, 2) -> (0, 47.25) projected
  line L3 (0, -47) -> (0, -42) projected
  line L4 (26, -42) -> (26, 2)
  line L5 (35, -42) -> (35, 2) projected
  line L6 (35, 2) -> (26, 2) projected
  line L7 (26, -42) -> (35, -42) projected
  line L8 (-9, 2) -> (-9, -42) projected
  line L9 (-9, -42) -> (0, -42) projected
  line L10 (0, 2) -> (-9, 2) projected
  line L11 (0, -42) -> (0, 2) projected
  point P0 (2, 0)
extrude "Extrusion20" cut sketch "Sketch20" along normal mid plane 10
sketch "Sketch21" plane through (-2, 46, 0) normal (0, 1, 0) x (1, 0, 0)
  line L0 (0, 47.25) -> (26, 47.25) projected
  line L1 (24, -87.25) -> (24, 47.25) projected
  line L2 (2, 47.25) -> (2, -87.25) projected
  line L3 (26, 47.25) -> (0, 47.25) projected
  circle A0 centre (13, 47.25) radius 11
  point P0 (2, 0)
extrude "Extrusion21" cut sketch "Sketch21" against normal blind 100
sketch "Sketch22" plane through (0, 0, 87.25) normal (0, 0, 1) x (1, 0, 0)
  line L0 (22, 0) -> (0, 0) projected
  line L1 (0, 0) -> (0, 44) projected
  line L2 (0, 44) -> (22, 44) projected
  line L3 (22, 44) -> (22, 0) projected
  line L4 (24, 46) -> (-2, 46) projected
  line L5 (-2, 46) -> (-2, -2) projected
  line L6 (-2, -2) -> (24, -2) projected
  line L7 (24, -2) -> (24, 46) projected
extrude "Extrusion22" add sketch "Sketch22" along normal blind 2 contours L0 L1 L2 L3 | L7 L6 L5 L4
sketch "Sketch24" plane through (-2, 46, 77) normal (0, 0, 1) x (1, 0, 0)
  line L0 (0, 3) -> (26, 3) projected
  line L1 (26, 3) -> (0, 3) projected
  line L2 (13, 3) -> (50.3, 3)
  line L3 (50.3, 3) -> (-24.3, 3)
  line L4 (-24.3, 3) -> (-24.3, 0)
  line L5 (-24.3, 0) -> (50.3, 0)
  line L6 (50.3, 0) -> (50.3, 3)
  point P0 (2, -46)
  dimension "d98" = 37.3
  dimension "d99" = 74.6
  dimension "d100" = 3
extrude "Extrusion24" add sketch "Sketch24" against normal blind 2
sketch "Sketch25" plane through (24, 46, 77) normal (0, 0, 1) x (1, 0, 0)
  line L0 (-50.3, 0) -> (-50.3, 3) projected
  line L1 (-50.3, 0) -> (-63.3, 0)
  line L2 (24.3, 0) -> (0, 0) projected
  line L3 (24.3, 0) -> (37.3, 0)
  line L4 (24.3, 57.5) -> (-50.3, 57.5)
  line L5 (-63.3, 57.5) -> (-63.3, 0)
  line L6 (-50.3, 3) -> (24.3, 3) projected
  line L7 (-50.3, 3) -> (-50.3, 57.5)
  line L8 (24.3, 3) -> (24.3, 57.5)
  line L9 (-63.3, 57.5) -> (-63.3, 59.5)
  line L10 (-63.3, 59.5) -> (37.3, 59.5)
  line L11 (37.3, 0) -> (37.3, 57.5)
  line L12 (37.3, 57.5) -> (37.3, 59.5)
  line L13 (37.3, 59.5) -> (-63.3, 59.5)
  line L14 (-63.3, 0) -> (-50.3, 0)
  line L15 (-26, 0) -> (-50.3, 0) projected
  line L16 (-50.3, 3) -> (-50.3, 0)
  line L17 (24.3, 3) -> (24.3, 0)
  line L18 (37.3, 0) -> (24.3, 0)
  line L19 (24.3, 57.5) -> (24.3, 0)
  point P0 (-24, -46)
  dimension "d103" = 13
  dimension "d104" = 13
  dimension "d105" = 57.5
  dimension "d106" = 2
  dimension "d107" = 57.5
  dimension "d108" = 2
extrude "Extrusion25" add sketch "Sketch25" against normal blind 2 contours L1 L5 L9 L10 L12 L11 L3 L17 L8 L4 L7 L0
sketch "Sketch26" plane through (24, 46, 75) normal (0, -1, 0) x (1, 0, 0)
  line L0 (0, 0) -> (0, 2) projected
  line L1 (37.3, 0) -> (0, 0) projected
  line L2 (37.3, 2) -> (37.3, 0) projected
  line L3 (0, 2) -> (37.3, 2) projected
  line L4 (0, 0) -> (0, 2) projected
  line L5 (0, 2) -> (0, -28)
  line L6 (0, -28) -> (37.3, -28)
  line L7 (37.3, -28) -> (37.3, 2)
  point P0 (-24, -75)
extrude "Extrusion26" add sketch "Sketch26" along normal blind 2
sketch "Sketch27" plane through (-2, 46, 0) normal (0, 1, 0) x (1, 0, 0)
  line L0 (0, -75) -> (0, -49) projected
  line L1 (-37.3, -75) -> (63.3, -75) projected
  line L2 (0, -77) -> (0, -75) projected
  line L3 (0, -77) -> (-37.3, -77) projected
  line L4 (-37.3, -77) -> (-37.3, -75) projected
  line L5 (0, -75) -> (-37.3, -75) projected
  line L6 (-37.3, -77) -> (-37.3, -49)
  line L7 (26, -49) -> (0, -49) projected
  line L8 (-37.3, -49) -> (0, -49)
  line L9 (0, -49) -> (0, -75)
  line L10 (63.3, -77) -> (-37.3, -77) projected
  line L11 (26, -77) -> (0, -77) projected
  line L12 (-37.3, -77) -> (0, -77)
  line L13 (0, -77) -> (0, -49)
  line L14 (0, -49) -> (0, -47)
  line L15 (0, -28) -> (0, -89.25) projected
  line L16 (0, -47) -> (-37.3, -47)
  line L17 (-37.3, -47) -> (-37.3, -49)
  point P0 (2, 0)
  dimension "d113" = 2
extrude "Extrusion27" add sketch "Sketch27" against normal blind 2
sketch "Sketch28" plane through (-2, 46, 77) normal (0, 0, 1) x (1, 0, 0)
  line L0 (-24.3, 57.5) -> (50.3, 57.5) projected
  line L1 (-24.3, 55.5) -> (50.3, 55.5)
  line L2 (-24.3, 57.5) -> (-24.3, 3) projected
  line L3 (-24.3, 55.5) -> (-24.3, 57.5)
  line L4 (-24.3, 57.5) -> (50.3, 57.5)
  line L5 (50.3, 3) -> (50.3, 57.5) projected
  line L6 (50.3, 55.5) -> (50.3, 57.5)
  point P0 (2, -46)
  dimension "d116" = 2
extrude "Extrusion28" add sketch "Sketch28" against normal blind 2
sketch "Sketch29" plane through (-39.3, 105.5, 77) normal (0, 1, 0) x (1, 0, 0)
  line L0 (100.6, 0) -> (0, 0) projected
  line L1 (100.6, 0) -> (100.6, 2) projected
  line L2 (0, 2) -> (100.6, 2) projected
  line L3 (0, 0) -> (0, 2) projected
  line L4 (63.3, 30) -> (37.3, 30) projected
  line L5 (37.3, 30) -> (37.3, 28) projected
  line L6 (37.3, 28) -> (63.3, 28) projected
  line L7 (63.3, 28) -> (63.3, 30) projected
  line L8 (63.3, 30) -> (100.6, 30) projected
  line L9 (100.6, 0) -> (100.6, 30)
  line L10 (100.6, 30) -> (0, 30)
  line L11 (0, 30) -> (0, 0)
  point P0 (39.3, 77)
extrude "Extrusion29" add sketch "Sketch29" along normal blind 2
sketch "Sketch30" plane through (61.3, 46, 75) normal (1, 0, 0) x (0, 0, -1)
  line L0 (-2, 61.5) -> (28, 61.5) projected
  line L1 (-2, -2) -> (-2, 61.5) projected
  line L2 (28, -2) -> (-2, -2) projected
  line L3 (28, 0) -> (28, 30) projected
  line L4 (28, 0) -> (28, -2) projected
  line L5 (28, 59.5) -> (28, 61.5) projected
  line L6 (28, 61.5) -> (28, 30)
  point P0 (75, -46)
extrude "Extrusion30" add sketch "Sketch30" along normal blind 2
sketch "Sketch31" plane through (61.3, 105.5, 47) normal (0, 0, -1) x (-1, 0, 0)
  line L0 (100.6, 2) -> (-2, 2) projected
  line L1 (-2, -61.5) -> (-2, 2) projected
  line L2 (37.3, -61.5) -> (-2, -61.5) projected
  line L3 (100.6, -61.5) -> (63.3, -61.5) projected
  line L4 (100.6, -59.5) -> (100.6, 0) projected
  line L5 (100.6, -59.5) -> (100.6, -61.5) projected
  line L6 (100.6, 0) -> (100.6, 2) projected
  line L7 (37.3, -61.5) -> (63.3, -61.5)
  point P0 (61.3, -105.5)
extrude "Extrusion31" add sketch "Sketch31" against normal blind 2
fillet "Fillet1" radius 2 2 edges at (-2, 22, 89.25) (24, 22, 89.25)
fillet "Fillet2" radius 2 3 edges at (-2, 46, -0.125) (24, 46, -0.125) (11, 46, 89.25)
properties part number "InternalSupport"
